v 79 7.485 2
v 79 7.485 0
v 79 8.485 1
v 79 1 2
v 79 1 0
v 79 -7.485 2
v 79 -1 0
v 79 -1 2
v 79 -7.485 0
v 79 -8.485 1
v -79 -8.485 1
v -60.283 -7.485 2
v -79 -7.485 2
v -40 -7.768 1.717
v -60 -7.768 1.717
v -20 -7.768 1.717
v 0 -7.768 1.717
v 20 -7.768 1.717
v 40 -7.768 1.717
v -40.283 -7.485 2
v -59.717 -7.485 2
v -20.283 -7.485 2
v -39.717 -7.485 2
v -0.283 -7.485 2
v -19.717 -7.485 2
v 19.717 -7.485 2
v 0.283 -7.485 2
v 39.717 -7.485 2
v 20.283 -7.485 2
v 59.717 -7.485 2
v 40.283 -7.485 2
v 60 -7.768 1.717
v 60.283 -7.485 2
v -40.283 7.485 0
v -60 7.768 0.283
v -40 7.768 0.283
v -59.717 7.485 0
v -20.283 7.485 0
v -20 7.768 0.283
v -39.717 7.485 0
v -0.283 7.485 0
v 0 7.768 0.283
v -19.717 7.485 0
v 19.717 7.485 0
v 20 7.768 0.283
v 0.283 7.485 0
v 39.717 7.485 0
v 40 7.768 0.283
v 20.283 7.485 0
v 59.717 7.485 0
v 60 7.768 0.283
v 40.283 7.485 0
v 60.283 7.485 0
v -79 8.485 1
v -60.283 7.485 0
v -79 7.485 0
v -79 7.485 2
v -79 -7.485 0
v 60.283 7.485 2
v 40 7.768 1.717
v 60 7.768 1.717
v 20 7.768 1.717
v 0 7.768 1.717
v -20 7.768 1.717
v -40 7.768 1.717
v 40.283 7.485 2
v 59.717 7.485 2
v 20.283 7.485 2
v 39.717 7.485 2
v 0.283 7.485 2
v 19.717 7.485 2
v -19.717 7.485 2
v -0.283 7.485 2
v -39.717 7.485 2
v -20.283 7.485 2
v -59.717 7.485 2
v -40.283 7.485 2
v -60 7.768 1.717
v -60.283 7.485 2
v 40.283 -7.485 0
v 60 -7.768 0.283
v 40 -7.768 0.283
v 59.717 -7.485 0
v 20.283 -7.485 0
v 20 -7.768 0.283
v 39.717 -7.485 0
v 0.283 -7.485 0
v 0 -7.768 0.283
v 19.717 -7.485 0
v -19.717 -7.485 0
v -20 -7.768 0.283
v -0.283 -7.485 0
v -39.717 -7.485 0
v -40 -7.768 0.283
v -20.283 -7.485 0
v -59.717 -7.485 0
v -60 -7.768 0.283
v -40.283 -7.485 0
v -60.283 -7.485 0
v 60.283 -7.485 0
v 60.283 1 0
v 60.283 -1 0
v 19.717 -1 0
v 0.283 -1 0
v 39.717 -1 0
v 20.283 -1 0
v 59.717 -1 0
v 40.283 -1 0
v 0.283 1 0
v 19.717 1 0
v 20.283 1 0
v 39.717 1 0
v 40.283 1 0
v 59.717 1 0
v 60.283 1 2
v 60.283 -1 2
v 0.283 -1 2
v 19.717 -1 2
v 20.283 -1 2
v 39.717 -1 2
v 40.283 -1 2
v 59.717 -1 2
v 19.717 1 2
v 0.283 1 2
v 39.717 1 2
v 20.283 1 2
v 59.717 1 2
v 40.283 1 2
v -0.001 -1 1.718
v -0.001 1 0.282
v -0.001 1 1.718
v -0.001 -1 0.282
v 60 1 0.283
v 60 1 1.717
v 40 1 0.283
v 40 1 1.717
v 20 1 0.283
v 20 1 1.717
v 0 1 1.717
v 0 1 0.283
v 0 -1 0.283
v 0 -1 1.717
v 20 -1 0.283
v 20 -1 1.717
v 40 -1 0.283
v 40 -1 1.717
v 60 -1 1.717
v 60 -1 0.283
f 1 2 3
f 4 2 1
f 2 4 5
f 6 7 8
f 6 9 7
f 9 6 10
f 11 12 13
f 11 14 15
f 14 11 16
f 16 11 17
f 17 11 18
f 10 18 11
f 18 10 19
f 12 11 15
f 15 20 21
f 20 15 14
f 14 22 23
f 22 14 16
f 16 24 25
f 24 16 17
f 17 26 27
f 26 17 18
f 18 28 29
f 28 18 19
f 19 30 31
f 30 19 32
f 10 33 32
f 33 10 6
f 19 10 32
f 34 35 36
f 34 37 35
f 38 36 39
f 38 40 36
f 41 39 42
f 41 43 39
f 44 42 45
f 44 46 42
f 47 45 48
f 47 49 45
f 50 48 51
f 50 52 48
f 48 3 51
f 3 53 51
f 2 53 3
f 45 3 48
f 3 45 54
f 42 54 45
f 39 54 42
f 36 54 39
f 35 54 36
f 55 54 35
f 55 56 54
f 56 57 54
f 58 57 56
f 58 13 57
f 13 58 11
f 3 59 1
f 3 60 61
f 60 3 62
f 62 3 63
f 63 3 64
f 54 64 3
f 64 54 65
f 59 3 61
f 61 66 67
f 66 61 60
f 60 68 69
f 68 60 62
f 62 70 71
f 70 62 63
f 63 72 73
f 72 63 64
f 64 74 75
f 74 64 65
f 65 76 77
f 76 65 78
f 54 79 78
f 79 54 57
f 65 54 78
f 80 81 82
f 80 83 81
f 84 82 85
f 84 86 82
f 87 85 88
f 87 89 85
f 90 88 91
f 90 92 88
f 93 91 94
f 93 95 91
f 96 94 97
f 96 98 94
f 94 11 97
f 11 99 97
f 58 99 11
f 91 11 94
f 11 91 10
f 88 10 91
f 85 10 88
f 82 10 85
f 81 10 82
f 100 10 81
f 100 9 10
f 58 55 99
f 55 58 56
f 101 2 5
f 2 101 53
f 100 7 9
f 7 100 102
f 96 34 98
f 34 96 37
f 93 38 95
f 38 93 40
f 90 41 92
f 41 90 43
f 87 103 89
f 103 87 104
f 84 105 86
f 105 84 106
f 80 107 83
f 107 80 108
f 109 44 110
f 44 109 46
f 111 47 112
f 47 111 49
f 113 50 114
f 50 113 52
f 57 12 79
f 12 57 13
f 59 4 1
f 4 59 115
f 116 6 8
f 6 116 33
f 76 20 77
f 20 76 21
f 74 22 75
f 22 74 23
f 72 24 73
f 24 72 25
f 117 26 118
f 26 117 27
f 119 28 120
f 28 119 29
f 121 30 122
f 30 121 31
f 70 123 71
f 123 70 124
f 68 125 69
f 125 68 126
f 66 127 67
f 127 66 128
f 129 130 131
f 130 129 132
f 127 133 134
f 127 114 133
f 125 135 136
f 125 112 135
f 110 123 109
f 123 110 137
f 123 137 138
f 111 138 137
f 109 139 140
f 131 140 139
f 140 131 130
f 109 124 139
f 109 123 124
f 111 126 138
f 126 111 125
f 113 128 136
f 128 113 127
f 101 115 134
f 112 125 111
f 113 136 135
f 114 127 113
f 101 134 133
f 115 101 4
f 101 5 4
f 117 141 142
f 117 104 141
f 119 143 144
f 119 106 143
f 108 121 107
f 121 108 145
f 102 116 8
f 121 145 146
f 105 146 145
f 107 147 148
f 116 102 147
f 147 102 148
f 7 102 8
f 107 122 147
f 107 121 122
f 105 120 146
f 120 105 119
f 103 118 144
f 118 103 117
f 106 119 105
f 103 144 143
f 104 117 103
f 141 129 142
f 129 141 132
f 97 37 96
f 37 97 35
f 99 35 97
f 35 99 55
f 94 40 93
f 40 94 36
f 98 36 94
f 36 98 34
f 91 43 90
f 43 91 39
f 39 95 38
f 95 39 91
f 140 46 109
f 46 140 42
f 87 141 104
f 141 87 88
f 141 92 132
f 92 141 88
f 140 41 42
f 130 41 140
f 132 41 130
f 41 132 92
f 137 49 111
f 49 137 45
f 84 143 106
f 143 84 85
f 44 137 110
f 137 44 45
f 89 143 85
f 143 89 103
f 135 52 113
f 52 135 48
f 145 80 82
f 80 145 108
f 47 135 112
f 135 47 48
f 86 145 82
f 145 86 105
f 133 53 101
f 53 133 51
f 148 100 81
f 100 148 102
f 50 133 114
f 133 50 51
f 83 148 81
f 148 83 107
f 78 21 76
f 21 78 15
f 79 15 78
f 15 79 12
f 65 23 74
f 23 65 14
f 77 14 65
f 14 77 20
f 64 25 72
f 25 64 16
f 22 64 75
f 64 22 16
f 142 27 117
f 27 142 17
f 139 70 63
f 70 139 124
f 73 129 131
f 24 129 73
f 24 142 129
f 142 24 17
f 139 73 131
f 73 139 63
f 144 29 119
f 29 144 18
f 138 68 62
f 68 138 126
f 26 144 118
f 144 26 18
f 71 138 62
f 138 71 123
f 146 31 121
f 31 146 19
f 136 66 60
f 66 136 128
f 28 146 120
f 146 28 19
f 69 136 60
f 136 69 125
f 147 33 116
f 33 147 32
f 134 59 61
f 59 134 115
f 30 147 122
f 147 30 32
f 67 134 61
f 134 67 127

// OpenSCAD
spool_height = 20;
spool_gap = 1;
spool_inner_diameter = 25;
dowel_radius = spool_inner_diameter/2 -1;
post_width = 16;

spool_span = spool_height+spool_gap;
num_spools = 6;

epsilon = .001;

total_spools_length = spool_span * num_spools;
left_edge = -total_spools_length / 2 - post_width;
dowel_length = total_spools_length + 2 * post_width;



module crossDowel() {
    difference() {
        translate([0,0,1])
        rotate([45,0,0])
        difference() {
            intersection() {
                cube([dowel_length, 12, 12], center=true);
                rotate([45, 0, 0])
                cube([dowel_length+2*epsilon, 2, 20], center=true);
            }
            translate([dowel_length/2,0,0])
            rotate([-45, 0, 0])
            cube([dowel_length+2*epsilon, 2, 20], center=true);
        }

        for (i=[0:10]) {
            translate([i*20-100,0,0])
            rotate([0,45,0])
            cube([.4, 100, .4], center=true);
        }

        for (i=[0:10]) {
            translate([i*20-100,0,2])
            rotate([0,45,0])
            cube([.4, 100, .4], center=true);
        }
    }
}

crossDowel();
